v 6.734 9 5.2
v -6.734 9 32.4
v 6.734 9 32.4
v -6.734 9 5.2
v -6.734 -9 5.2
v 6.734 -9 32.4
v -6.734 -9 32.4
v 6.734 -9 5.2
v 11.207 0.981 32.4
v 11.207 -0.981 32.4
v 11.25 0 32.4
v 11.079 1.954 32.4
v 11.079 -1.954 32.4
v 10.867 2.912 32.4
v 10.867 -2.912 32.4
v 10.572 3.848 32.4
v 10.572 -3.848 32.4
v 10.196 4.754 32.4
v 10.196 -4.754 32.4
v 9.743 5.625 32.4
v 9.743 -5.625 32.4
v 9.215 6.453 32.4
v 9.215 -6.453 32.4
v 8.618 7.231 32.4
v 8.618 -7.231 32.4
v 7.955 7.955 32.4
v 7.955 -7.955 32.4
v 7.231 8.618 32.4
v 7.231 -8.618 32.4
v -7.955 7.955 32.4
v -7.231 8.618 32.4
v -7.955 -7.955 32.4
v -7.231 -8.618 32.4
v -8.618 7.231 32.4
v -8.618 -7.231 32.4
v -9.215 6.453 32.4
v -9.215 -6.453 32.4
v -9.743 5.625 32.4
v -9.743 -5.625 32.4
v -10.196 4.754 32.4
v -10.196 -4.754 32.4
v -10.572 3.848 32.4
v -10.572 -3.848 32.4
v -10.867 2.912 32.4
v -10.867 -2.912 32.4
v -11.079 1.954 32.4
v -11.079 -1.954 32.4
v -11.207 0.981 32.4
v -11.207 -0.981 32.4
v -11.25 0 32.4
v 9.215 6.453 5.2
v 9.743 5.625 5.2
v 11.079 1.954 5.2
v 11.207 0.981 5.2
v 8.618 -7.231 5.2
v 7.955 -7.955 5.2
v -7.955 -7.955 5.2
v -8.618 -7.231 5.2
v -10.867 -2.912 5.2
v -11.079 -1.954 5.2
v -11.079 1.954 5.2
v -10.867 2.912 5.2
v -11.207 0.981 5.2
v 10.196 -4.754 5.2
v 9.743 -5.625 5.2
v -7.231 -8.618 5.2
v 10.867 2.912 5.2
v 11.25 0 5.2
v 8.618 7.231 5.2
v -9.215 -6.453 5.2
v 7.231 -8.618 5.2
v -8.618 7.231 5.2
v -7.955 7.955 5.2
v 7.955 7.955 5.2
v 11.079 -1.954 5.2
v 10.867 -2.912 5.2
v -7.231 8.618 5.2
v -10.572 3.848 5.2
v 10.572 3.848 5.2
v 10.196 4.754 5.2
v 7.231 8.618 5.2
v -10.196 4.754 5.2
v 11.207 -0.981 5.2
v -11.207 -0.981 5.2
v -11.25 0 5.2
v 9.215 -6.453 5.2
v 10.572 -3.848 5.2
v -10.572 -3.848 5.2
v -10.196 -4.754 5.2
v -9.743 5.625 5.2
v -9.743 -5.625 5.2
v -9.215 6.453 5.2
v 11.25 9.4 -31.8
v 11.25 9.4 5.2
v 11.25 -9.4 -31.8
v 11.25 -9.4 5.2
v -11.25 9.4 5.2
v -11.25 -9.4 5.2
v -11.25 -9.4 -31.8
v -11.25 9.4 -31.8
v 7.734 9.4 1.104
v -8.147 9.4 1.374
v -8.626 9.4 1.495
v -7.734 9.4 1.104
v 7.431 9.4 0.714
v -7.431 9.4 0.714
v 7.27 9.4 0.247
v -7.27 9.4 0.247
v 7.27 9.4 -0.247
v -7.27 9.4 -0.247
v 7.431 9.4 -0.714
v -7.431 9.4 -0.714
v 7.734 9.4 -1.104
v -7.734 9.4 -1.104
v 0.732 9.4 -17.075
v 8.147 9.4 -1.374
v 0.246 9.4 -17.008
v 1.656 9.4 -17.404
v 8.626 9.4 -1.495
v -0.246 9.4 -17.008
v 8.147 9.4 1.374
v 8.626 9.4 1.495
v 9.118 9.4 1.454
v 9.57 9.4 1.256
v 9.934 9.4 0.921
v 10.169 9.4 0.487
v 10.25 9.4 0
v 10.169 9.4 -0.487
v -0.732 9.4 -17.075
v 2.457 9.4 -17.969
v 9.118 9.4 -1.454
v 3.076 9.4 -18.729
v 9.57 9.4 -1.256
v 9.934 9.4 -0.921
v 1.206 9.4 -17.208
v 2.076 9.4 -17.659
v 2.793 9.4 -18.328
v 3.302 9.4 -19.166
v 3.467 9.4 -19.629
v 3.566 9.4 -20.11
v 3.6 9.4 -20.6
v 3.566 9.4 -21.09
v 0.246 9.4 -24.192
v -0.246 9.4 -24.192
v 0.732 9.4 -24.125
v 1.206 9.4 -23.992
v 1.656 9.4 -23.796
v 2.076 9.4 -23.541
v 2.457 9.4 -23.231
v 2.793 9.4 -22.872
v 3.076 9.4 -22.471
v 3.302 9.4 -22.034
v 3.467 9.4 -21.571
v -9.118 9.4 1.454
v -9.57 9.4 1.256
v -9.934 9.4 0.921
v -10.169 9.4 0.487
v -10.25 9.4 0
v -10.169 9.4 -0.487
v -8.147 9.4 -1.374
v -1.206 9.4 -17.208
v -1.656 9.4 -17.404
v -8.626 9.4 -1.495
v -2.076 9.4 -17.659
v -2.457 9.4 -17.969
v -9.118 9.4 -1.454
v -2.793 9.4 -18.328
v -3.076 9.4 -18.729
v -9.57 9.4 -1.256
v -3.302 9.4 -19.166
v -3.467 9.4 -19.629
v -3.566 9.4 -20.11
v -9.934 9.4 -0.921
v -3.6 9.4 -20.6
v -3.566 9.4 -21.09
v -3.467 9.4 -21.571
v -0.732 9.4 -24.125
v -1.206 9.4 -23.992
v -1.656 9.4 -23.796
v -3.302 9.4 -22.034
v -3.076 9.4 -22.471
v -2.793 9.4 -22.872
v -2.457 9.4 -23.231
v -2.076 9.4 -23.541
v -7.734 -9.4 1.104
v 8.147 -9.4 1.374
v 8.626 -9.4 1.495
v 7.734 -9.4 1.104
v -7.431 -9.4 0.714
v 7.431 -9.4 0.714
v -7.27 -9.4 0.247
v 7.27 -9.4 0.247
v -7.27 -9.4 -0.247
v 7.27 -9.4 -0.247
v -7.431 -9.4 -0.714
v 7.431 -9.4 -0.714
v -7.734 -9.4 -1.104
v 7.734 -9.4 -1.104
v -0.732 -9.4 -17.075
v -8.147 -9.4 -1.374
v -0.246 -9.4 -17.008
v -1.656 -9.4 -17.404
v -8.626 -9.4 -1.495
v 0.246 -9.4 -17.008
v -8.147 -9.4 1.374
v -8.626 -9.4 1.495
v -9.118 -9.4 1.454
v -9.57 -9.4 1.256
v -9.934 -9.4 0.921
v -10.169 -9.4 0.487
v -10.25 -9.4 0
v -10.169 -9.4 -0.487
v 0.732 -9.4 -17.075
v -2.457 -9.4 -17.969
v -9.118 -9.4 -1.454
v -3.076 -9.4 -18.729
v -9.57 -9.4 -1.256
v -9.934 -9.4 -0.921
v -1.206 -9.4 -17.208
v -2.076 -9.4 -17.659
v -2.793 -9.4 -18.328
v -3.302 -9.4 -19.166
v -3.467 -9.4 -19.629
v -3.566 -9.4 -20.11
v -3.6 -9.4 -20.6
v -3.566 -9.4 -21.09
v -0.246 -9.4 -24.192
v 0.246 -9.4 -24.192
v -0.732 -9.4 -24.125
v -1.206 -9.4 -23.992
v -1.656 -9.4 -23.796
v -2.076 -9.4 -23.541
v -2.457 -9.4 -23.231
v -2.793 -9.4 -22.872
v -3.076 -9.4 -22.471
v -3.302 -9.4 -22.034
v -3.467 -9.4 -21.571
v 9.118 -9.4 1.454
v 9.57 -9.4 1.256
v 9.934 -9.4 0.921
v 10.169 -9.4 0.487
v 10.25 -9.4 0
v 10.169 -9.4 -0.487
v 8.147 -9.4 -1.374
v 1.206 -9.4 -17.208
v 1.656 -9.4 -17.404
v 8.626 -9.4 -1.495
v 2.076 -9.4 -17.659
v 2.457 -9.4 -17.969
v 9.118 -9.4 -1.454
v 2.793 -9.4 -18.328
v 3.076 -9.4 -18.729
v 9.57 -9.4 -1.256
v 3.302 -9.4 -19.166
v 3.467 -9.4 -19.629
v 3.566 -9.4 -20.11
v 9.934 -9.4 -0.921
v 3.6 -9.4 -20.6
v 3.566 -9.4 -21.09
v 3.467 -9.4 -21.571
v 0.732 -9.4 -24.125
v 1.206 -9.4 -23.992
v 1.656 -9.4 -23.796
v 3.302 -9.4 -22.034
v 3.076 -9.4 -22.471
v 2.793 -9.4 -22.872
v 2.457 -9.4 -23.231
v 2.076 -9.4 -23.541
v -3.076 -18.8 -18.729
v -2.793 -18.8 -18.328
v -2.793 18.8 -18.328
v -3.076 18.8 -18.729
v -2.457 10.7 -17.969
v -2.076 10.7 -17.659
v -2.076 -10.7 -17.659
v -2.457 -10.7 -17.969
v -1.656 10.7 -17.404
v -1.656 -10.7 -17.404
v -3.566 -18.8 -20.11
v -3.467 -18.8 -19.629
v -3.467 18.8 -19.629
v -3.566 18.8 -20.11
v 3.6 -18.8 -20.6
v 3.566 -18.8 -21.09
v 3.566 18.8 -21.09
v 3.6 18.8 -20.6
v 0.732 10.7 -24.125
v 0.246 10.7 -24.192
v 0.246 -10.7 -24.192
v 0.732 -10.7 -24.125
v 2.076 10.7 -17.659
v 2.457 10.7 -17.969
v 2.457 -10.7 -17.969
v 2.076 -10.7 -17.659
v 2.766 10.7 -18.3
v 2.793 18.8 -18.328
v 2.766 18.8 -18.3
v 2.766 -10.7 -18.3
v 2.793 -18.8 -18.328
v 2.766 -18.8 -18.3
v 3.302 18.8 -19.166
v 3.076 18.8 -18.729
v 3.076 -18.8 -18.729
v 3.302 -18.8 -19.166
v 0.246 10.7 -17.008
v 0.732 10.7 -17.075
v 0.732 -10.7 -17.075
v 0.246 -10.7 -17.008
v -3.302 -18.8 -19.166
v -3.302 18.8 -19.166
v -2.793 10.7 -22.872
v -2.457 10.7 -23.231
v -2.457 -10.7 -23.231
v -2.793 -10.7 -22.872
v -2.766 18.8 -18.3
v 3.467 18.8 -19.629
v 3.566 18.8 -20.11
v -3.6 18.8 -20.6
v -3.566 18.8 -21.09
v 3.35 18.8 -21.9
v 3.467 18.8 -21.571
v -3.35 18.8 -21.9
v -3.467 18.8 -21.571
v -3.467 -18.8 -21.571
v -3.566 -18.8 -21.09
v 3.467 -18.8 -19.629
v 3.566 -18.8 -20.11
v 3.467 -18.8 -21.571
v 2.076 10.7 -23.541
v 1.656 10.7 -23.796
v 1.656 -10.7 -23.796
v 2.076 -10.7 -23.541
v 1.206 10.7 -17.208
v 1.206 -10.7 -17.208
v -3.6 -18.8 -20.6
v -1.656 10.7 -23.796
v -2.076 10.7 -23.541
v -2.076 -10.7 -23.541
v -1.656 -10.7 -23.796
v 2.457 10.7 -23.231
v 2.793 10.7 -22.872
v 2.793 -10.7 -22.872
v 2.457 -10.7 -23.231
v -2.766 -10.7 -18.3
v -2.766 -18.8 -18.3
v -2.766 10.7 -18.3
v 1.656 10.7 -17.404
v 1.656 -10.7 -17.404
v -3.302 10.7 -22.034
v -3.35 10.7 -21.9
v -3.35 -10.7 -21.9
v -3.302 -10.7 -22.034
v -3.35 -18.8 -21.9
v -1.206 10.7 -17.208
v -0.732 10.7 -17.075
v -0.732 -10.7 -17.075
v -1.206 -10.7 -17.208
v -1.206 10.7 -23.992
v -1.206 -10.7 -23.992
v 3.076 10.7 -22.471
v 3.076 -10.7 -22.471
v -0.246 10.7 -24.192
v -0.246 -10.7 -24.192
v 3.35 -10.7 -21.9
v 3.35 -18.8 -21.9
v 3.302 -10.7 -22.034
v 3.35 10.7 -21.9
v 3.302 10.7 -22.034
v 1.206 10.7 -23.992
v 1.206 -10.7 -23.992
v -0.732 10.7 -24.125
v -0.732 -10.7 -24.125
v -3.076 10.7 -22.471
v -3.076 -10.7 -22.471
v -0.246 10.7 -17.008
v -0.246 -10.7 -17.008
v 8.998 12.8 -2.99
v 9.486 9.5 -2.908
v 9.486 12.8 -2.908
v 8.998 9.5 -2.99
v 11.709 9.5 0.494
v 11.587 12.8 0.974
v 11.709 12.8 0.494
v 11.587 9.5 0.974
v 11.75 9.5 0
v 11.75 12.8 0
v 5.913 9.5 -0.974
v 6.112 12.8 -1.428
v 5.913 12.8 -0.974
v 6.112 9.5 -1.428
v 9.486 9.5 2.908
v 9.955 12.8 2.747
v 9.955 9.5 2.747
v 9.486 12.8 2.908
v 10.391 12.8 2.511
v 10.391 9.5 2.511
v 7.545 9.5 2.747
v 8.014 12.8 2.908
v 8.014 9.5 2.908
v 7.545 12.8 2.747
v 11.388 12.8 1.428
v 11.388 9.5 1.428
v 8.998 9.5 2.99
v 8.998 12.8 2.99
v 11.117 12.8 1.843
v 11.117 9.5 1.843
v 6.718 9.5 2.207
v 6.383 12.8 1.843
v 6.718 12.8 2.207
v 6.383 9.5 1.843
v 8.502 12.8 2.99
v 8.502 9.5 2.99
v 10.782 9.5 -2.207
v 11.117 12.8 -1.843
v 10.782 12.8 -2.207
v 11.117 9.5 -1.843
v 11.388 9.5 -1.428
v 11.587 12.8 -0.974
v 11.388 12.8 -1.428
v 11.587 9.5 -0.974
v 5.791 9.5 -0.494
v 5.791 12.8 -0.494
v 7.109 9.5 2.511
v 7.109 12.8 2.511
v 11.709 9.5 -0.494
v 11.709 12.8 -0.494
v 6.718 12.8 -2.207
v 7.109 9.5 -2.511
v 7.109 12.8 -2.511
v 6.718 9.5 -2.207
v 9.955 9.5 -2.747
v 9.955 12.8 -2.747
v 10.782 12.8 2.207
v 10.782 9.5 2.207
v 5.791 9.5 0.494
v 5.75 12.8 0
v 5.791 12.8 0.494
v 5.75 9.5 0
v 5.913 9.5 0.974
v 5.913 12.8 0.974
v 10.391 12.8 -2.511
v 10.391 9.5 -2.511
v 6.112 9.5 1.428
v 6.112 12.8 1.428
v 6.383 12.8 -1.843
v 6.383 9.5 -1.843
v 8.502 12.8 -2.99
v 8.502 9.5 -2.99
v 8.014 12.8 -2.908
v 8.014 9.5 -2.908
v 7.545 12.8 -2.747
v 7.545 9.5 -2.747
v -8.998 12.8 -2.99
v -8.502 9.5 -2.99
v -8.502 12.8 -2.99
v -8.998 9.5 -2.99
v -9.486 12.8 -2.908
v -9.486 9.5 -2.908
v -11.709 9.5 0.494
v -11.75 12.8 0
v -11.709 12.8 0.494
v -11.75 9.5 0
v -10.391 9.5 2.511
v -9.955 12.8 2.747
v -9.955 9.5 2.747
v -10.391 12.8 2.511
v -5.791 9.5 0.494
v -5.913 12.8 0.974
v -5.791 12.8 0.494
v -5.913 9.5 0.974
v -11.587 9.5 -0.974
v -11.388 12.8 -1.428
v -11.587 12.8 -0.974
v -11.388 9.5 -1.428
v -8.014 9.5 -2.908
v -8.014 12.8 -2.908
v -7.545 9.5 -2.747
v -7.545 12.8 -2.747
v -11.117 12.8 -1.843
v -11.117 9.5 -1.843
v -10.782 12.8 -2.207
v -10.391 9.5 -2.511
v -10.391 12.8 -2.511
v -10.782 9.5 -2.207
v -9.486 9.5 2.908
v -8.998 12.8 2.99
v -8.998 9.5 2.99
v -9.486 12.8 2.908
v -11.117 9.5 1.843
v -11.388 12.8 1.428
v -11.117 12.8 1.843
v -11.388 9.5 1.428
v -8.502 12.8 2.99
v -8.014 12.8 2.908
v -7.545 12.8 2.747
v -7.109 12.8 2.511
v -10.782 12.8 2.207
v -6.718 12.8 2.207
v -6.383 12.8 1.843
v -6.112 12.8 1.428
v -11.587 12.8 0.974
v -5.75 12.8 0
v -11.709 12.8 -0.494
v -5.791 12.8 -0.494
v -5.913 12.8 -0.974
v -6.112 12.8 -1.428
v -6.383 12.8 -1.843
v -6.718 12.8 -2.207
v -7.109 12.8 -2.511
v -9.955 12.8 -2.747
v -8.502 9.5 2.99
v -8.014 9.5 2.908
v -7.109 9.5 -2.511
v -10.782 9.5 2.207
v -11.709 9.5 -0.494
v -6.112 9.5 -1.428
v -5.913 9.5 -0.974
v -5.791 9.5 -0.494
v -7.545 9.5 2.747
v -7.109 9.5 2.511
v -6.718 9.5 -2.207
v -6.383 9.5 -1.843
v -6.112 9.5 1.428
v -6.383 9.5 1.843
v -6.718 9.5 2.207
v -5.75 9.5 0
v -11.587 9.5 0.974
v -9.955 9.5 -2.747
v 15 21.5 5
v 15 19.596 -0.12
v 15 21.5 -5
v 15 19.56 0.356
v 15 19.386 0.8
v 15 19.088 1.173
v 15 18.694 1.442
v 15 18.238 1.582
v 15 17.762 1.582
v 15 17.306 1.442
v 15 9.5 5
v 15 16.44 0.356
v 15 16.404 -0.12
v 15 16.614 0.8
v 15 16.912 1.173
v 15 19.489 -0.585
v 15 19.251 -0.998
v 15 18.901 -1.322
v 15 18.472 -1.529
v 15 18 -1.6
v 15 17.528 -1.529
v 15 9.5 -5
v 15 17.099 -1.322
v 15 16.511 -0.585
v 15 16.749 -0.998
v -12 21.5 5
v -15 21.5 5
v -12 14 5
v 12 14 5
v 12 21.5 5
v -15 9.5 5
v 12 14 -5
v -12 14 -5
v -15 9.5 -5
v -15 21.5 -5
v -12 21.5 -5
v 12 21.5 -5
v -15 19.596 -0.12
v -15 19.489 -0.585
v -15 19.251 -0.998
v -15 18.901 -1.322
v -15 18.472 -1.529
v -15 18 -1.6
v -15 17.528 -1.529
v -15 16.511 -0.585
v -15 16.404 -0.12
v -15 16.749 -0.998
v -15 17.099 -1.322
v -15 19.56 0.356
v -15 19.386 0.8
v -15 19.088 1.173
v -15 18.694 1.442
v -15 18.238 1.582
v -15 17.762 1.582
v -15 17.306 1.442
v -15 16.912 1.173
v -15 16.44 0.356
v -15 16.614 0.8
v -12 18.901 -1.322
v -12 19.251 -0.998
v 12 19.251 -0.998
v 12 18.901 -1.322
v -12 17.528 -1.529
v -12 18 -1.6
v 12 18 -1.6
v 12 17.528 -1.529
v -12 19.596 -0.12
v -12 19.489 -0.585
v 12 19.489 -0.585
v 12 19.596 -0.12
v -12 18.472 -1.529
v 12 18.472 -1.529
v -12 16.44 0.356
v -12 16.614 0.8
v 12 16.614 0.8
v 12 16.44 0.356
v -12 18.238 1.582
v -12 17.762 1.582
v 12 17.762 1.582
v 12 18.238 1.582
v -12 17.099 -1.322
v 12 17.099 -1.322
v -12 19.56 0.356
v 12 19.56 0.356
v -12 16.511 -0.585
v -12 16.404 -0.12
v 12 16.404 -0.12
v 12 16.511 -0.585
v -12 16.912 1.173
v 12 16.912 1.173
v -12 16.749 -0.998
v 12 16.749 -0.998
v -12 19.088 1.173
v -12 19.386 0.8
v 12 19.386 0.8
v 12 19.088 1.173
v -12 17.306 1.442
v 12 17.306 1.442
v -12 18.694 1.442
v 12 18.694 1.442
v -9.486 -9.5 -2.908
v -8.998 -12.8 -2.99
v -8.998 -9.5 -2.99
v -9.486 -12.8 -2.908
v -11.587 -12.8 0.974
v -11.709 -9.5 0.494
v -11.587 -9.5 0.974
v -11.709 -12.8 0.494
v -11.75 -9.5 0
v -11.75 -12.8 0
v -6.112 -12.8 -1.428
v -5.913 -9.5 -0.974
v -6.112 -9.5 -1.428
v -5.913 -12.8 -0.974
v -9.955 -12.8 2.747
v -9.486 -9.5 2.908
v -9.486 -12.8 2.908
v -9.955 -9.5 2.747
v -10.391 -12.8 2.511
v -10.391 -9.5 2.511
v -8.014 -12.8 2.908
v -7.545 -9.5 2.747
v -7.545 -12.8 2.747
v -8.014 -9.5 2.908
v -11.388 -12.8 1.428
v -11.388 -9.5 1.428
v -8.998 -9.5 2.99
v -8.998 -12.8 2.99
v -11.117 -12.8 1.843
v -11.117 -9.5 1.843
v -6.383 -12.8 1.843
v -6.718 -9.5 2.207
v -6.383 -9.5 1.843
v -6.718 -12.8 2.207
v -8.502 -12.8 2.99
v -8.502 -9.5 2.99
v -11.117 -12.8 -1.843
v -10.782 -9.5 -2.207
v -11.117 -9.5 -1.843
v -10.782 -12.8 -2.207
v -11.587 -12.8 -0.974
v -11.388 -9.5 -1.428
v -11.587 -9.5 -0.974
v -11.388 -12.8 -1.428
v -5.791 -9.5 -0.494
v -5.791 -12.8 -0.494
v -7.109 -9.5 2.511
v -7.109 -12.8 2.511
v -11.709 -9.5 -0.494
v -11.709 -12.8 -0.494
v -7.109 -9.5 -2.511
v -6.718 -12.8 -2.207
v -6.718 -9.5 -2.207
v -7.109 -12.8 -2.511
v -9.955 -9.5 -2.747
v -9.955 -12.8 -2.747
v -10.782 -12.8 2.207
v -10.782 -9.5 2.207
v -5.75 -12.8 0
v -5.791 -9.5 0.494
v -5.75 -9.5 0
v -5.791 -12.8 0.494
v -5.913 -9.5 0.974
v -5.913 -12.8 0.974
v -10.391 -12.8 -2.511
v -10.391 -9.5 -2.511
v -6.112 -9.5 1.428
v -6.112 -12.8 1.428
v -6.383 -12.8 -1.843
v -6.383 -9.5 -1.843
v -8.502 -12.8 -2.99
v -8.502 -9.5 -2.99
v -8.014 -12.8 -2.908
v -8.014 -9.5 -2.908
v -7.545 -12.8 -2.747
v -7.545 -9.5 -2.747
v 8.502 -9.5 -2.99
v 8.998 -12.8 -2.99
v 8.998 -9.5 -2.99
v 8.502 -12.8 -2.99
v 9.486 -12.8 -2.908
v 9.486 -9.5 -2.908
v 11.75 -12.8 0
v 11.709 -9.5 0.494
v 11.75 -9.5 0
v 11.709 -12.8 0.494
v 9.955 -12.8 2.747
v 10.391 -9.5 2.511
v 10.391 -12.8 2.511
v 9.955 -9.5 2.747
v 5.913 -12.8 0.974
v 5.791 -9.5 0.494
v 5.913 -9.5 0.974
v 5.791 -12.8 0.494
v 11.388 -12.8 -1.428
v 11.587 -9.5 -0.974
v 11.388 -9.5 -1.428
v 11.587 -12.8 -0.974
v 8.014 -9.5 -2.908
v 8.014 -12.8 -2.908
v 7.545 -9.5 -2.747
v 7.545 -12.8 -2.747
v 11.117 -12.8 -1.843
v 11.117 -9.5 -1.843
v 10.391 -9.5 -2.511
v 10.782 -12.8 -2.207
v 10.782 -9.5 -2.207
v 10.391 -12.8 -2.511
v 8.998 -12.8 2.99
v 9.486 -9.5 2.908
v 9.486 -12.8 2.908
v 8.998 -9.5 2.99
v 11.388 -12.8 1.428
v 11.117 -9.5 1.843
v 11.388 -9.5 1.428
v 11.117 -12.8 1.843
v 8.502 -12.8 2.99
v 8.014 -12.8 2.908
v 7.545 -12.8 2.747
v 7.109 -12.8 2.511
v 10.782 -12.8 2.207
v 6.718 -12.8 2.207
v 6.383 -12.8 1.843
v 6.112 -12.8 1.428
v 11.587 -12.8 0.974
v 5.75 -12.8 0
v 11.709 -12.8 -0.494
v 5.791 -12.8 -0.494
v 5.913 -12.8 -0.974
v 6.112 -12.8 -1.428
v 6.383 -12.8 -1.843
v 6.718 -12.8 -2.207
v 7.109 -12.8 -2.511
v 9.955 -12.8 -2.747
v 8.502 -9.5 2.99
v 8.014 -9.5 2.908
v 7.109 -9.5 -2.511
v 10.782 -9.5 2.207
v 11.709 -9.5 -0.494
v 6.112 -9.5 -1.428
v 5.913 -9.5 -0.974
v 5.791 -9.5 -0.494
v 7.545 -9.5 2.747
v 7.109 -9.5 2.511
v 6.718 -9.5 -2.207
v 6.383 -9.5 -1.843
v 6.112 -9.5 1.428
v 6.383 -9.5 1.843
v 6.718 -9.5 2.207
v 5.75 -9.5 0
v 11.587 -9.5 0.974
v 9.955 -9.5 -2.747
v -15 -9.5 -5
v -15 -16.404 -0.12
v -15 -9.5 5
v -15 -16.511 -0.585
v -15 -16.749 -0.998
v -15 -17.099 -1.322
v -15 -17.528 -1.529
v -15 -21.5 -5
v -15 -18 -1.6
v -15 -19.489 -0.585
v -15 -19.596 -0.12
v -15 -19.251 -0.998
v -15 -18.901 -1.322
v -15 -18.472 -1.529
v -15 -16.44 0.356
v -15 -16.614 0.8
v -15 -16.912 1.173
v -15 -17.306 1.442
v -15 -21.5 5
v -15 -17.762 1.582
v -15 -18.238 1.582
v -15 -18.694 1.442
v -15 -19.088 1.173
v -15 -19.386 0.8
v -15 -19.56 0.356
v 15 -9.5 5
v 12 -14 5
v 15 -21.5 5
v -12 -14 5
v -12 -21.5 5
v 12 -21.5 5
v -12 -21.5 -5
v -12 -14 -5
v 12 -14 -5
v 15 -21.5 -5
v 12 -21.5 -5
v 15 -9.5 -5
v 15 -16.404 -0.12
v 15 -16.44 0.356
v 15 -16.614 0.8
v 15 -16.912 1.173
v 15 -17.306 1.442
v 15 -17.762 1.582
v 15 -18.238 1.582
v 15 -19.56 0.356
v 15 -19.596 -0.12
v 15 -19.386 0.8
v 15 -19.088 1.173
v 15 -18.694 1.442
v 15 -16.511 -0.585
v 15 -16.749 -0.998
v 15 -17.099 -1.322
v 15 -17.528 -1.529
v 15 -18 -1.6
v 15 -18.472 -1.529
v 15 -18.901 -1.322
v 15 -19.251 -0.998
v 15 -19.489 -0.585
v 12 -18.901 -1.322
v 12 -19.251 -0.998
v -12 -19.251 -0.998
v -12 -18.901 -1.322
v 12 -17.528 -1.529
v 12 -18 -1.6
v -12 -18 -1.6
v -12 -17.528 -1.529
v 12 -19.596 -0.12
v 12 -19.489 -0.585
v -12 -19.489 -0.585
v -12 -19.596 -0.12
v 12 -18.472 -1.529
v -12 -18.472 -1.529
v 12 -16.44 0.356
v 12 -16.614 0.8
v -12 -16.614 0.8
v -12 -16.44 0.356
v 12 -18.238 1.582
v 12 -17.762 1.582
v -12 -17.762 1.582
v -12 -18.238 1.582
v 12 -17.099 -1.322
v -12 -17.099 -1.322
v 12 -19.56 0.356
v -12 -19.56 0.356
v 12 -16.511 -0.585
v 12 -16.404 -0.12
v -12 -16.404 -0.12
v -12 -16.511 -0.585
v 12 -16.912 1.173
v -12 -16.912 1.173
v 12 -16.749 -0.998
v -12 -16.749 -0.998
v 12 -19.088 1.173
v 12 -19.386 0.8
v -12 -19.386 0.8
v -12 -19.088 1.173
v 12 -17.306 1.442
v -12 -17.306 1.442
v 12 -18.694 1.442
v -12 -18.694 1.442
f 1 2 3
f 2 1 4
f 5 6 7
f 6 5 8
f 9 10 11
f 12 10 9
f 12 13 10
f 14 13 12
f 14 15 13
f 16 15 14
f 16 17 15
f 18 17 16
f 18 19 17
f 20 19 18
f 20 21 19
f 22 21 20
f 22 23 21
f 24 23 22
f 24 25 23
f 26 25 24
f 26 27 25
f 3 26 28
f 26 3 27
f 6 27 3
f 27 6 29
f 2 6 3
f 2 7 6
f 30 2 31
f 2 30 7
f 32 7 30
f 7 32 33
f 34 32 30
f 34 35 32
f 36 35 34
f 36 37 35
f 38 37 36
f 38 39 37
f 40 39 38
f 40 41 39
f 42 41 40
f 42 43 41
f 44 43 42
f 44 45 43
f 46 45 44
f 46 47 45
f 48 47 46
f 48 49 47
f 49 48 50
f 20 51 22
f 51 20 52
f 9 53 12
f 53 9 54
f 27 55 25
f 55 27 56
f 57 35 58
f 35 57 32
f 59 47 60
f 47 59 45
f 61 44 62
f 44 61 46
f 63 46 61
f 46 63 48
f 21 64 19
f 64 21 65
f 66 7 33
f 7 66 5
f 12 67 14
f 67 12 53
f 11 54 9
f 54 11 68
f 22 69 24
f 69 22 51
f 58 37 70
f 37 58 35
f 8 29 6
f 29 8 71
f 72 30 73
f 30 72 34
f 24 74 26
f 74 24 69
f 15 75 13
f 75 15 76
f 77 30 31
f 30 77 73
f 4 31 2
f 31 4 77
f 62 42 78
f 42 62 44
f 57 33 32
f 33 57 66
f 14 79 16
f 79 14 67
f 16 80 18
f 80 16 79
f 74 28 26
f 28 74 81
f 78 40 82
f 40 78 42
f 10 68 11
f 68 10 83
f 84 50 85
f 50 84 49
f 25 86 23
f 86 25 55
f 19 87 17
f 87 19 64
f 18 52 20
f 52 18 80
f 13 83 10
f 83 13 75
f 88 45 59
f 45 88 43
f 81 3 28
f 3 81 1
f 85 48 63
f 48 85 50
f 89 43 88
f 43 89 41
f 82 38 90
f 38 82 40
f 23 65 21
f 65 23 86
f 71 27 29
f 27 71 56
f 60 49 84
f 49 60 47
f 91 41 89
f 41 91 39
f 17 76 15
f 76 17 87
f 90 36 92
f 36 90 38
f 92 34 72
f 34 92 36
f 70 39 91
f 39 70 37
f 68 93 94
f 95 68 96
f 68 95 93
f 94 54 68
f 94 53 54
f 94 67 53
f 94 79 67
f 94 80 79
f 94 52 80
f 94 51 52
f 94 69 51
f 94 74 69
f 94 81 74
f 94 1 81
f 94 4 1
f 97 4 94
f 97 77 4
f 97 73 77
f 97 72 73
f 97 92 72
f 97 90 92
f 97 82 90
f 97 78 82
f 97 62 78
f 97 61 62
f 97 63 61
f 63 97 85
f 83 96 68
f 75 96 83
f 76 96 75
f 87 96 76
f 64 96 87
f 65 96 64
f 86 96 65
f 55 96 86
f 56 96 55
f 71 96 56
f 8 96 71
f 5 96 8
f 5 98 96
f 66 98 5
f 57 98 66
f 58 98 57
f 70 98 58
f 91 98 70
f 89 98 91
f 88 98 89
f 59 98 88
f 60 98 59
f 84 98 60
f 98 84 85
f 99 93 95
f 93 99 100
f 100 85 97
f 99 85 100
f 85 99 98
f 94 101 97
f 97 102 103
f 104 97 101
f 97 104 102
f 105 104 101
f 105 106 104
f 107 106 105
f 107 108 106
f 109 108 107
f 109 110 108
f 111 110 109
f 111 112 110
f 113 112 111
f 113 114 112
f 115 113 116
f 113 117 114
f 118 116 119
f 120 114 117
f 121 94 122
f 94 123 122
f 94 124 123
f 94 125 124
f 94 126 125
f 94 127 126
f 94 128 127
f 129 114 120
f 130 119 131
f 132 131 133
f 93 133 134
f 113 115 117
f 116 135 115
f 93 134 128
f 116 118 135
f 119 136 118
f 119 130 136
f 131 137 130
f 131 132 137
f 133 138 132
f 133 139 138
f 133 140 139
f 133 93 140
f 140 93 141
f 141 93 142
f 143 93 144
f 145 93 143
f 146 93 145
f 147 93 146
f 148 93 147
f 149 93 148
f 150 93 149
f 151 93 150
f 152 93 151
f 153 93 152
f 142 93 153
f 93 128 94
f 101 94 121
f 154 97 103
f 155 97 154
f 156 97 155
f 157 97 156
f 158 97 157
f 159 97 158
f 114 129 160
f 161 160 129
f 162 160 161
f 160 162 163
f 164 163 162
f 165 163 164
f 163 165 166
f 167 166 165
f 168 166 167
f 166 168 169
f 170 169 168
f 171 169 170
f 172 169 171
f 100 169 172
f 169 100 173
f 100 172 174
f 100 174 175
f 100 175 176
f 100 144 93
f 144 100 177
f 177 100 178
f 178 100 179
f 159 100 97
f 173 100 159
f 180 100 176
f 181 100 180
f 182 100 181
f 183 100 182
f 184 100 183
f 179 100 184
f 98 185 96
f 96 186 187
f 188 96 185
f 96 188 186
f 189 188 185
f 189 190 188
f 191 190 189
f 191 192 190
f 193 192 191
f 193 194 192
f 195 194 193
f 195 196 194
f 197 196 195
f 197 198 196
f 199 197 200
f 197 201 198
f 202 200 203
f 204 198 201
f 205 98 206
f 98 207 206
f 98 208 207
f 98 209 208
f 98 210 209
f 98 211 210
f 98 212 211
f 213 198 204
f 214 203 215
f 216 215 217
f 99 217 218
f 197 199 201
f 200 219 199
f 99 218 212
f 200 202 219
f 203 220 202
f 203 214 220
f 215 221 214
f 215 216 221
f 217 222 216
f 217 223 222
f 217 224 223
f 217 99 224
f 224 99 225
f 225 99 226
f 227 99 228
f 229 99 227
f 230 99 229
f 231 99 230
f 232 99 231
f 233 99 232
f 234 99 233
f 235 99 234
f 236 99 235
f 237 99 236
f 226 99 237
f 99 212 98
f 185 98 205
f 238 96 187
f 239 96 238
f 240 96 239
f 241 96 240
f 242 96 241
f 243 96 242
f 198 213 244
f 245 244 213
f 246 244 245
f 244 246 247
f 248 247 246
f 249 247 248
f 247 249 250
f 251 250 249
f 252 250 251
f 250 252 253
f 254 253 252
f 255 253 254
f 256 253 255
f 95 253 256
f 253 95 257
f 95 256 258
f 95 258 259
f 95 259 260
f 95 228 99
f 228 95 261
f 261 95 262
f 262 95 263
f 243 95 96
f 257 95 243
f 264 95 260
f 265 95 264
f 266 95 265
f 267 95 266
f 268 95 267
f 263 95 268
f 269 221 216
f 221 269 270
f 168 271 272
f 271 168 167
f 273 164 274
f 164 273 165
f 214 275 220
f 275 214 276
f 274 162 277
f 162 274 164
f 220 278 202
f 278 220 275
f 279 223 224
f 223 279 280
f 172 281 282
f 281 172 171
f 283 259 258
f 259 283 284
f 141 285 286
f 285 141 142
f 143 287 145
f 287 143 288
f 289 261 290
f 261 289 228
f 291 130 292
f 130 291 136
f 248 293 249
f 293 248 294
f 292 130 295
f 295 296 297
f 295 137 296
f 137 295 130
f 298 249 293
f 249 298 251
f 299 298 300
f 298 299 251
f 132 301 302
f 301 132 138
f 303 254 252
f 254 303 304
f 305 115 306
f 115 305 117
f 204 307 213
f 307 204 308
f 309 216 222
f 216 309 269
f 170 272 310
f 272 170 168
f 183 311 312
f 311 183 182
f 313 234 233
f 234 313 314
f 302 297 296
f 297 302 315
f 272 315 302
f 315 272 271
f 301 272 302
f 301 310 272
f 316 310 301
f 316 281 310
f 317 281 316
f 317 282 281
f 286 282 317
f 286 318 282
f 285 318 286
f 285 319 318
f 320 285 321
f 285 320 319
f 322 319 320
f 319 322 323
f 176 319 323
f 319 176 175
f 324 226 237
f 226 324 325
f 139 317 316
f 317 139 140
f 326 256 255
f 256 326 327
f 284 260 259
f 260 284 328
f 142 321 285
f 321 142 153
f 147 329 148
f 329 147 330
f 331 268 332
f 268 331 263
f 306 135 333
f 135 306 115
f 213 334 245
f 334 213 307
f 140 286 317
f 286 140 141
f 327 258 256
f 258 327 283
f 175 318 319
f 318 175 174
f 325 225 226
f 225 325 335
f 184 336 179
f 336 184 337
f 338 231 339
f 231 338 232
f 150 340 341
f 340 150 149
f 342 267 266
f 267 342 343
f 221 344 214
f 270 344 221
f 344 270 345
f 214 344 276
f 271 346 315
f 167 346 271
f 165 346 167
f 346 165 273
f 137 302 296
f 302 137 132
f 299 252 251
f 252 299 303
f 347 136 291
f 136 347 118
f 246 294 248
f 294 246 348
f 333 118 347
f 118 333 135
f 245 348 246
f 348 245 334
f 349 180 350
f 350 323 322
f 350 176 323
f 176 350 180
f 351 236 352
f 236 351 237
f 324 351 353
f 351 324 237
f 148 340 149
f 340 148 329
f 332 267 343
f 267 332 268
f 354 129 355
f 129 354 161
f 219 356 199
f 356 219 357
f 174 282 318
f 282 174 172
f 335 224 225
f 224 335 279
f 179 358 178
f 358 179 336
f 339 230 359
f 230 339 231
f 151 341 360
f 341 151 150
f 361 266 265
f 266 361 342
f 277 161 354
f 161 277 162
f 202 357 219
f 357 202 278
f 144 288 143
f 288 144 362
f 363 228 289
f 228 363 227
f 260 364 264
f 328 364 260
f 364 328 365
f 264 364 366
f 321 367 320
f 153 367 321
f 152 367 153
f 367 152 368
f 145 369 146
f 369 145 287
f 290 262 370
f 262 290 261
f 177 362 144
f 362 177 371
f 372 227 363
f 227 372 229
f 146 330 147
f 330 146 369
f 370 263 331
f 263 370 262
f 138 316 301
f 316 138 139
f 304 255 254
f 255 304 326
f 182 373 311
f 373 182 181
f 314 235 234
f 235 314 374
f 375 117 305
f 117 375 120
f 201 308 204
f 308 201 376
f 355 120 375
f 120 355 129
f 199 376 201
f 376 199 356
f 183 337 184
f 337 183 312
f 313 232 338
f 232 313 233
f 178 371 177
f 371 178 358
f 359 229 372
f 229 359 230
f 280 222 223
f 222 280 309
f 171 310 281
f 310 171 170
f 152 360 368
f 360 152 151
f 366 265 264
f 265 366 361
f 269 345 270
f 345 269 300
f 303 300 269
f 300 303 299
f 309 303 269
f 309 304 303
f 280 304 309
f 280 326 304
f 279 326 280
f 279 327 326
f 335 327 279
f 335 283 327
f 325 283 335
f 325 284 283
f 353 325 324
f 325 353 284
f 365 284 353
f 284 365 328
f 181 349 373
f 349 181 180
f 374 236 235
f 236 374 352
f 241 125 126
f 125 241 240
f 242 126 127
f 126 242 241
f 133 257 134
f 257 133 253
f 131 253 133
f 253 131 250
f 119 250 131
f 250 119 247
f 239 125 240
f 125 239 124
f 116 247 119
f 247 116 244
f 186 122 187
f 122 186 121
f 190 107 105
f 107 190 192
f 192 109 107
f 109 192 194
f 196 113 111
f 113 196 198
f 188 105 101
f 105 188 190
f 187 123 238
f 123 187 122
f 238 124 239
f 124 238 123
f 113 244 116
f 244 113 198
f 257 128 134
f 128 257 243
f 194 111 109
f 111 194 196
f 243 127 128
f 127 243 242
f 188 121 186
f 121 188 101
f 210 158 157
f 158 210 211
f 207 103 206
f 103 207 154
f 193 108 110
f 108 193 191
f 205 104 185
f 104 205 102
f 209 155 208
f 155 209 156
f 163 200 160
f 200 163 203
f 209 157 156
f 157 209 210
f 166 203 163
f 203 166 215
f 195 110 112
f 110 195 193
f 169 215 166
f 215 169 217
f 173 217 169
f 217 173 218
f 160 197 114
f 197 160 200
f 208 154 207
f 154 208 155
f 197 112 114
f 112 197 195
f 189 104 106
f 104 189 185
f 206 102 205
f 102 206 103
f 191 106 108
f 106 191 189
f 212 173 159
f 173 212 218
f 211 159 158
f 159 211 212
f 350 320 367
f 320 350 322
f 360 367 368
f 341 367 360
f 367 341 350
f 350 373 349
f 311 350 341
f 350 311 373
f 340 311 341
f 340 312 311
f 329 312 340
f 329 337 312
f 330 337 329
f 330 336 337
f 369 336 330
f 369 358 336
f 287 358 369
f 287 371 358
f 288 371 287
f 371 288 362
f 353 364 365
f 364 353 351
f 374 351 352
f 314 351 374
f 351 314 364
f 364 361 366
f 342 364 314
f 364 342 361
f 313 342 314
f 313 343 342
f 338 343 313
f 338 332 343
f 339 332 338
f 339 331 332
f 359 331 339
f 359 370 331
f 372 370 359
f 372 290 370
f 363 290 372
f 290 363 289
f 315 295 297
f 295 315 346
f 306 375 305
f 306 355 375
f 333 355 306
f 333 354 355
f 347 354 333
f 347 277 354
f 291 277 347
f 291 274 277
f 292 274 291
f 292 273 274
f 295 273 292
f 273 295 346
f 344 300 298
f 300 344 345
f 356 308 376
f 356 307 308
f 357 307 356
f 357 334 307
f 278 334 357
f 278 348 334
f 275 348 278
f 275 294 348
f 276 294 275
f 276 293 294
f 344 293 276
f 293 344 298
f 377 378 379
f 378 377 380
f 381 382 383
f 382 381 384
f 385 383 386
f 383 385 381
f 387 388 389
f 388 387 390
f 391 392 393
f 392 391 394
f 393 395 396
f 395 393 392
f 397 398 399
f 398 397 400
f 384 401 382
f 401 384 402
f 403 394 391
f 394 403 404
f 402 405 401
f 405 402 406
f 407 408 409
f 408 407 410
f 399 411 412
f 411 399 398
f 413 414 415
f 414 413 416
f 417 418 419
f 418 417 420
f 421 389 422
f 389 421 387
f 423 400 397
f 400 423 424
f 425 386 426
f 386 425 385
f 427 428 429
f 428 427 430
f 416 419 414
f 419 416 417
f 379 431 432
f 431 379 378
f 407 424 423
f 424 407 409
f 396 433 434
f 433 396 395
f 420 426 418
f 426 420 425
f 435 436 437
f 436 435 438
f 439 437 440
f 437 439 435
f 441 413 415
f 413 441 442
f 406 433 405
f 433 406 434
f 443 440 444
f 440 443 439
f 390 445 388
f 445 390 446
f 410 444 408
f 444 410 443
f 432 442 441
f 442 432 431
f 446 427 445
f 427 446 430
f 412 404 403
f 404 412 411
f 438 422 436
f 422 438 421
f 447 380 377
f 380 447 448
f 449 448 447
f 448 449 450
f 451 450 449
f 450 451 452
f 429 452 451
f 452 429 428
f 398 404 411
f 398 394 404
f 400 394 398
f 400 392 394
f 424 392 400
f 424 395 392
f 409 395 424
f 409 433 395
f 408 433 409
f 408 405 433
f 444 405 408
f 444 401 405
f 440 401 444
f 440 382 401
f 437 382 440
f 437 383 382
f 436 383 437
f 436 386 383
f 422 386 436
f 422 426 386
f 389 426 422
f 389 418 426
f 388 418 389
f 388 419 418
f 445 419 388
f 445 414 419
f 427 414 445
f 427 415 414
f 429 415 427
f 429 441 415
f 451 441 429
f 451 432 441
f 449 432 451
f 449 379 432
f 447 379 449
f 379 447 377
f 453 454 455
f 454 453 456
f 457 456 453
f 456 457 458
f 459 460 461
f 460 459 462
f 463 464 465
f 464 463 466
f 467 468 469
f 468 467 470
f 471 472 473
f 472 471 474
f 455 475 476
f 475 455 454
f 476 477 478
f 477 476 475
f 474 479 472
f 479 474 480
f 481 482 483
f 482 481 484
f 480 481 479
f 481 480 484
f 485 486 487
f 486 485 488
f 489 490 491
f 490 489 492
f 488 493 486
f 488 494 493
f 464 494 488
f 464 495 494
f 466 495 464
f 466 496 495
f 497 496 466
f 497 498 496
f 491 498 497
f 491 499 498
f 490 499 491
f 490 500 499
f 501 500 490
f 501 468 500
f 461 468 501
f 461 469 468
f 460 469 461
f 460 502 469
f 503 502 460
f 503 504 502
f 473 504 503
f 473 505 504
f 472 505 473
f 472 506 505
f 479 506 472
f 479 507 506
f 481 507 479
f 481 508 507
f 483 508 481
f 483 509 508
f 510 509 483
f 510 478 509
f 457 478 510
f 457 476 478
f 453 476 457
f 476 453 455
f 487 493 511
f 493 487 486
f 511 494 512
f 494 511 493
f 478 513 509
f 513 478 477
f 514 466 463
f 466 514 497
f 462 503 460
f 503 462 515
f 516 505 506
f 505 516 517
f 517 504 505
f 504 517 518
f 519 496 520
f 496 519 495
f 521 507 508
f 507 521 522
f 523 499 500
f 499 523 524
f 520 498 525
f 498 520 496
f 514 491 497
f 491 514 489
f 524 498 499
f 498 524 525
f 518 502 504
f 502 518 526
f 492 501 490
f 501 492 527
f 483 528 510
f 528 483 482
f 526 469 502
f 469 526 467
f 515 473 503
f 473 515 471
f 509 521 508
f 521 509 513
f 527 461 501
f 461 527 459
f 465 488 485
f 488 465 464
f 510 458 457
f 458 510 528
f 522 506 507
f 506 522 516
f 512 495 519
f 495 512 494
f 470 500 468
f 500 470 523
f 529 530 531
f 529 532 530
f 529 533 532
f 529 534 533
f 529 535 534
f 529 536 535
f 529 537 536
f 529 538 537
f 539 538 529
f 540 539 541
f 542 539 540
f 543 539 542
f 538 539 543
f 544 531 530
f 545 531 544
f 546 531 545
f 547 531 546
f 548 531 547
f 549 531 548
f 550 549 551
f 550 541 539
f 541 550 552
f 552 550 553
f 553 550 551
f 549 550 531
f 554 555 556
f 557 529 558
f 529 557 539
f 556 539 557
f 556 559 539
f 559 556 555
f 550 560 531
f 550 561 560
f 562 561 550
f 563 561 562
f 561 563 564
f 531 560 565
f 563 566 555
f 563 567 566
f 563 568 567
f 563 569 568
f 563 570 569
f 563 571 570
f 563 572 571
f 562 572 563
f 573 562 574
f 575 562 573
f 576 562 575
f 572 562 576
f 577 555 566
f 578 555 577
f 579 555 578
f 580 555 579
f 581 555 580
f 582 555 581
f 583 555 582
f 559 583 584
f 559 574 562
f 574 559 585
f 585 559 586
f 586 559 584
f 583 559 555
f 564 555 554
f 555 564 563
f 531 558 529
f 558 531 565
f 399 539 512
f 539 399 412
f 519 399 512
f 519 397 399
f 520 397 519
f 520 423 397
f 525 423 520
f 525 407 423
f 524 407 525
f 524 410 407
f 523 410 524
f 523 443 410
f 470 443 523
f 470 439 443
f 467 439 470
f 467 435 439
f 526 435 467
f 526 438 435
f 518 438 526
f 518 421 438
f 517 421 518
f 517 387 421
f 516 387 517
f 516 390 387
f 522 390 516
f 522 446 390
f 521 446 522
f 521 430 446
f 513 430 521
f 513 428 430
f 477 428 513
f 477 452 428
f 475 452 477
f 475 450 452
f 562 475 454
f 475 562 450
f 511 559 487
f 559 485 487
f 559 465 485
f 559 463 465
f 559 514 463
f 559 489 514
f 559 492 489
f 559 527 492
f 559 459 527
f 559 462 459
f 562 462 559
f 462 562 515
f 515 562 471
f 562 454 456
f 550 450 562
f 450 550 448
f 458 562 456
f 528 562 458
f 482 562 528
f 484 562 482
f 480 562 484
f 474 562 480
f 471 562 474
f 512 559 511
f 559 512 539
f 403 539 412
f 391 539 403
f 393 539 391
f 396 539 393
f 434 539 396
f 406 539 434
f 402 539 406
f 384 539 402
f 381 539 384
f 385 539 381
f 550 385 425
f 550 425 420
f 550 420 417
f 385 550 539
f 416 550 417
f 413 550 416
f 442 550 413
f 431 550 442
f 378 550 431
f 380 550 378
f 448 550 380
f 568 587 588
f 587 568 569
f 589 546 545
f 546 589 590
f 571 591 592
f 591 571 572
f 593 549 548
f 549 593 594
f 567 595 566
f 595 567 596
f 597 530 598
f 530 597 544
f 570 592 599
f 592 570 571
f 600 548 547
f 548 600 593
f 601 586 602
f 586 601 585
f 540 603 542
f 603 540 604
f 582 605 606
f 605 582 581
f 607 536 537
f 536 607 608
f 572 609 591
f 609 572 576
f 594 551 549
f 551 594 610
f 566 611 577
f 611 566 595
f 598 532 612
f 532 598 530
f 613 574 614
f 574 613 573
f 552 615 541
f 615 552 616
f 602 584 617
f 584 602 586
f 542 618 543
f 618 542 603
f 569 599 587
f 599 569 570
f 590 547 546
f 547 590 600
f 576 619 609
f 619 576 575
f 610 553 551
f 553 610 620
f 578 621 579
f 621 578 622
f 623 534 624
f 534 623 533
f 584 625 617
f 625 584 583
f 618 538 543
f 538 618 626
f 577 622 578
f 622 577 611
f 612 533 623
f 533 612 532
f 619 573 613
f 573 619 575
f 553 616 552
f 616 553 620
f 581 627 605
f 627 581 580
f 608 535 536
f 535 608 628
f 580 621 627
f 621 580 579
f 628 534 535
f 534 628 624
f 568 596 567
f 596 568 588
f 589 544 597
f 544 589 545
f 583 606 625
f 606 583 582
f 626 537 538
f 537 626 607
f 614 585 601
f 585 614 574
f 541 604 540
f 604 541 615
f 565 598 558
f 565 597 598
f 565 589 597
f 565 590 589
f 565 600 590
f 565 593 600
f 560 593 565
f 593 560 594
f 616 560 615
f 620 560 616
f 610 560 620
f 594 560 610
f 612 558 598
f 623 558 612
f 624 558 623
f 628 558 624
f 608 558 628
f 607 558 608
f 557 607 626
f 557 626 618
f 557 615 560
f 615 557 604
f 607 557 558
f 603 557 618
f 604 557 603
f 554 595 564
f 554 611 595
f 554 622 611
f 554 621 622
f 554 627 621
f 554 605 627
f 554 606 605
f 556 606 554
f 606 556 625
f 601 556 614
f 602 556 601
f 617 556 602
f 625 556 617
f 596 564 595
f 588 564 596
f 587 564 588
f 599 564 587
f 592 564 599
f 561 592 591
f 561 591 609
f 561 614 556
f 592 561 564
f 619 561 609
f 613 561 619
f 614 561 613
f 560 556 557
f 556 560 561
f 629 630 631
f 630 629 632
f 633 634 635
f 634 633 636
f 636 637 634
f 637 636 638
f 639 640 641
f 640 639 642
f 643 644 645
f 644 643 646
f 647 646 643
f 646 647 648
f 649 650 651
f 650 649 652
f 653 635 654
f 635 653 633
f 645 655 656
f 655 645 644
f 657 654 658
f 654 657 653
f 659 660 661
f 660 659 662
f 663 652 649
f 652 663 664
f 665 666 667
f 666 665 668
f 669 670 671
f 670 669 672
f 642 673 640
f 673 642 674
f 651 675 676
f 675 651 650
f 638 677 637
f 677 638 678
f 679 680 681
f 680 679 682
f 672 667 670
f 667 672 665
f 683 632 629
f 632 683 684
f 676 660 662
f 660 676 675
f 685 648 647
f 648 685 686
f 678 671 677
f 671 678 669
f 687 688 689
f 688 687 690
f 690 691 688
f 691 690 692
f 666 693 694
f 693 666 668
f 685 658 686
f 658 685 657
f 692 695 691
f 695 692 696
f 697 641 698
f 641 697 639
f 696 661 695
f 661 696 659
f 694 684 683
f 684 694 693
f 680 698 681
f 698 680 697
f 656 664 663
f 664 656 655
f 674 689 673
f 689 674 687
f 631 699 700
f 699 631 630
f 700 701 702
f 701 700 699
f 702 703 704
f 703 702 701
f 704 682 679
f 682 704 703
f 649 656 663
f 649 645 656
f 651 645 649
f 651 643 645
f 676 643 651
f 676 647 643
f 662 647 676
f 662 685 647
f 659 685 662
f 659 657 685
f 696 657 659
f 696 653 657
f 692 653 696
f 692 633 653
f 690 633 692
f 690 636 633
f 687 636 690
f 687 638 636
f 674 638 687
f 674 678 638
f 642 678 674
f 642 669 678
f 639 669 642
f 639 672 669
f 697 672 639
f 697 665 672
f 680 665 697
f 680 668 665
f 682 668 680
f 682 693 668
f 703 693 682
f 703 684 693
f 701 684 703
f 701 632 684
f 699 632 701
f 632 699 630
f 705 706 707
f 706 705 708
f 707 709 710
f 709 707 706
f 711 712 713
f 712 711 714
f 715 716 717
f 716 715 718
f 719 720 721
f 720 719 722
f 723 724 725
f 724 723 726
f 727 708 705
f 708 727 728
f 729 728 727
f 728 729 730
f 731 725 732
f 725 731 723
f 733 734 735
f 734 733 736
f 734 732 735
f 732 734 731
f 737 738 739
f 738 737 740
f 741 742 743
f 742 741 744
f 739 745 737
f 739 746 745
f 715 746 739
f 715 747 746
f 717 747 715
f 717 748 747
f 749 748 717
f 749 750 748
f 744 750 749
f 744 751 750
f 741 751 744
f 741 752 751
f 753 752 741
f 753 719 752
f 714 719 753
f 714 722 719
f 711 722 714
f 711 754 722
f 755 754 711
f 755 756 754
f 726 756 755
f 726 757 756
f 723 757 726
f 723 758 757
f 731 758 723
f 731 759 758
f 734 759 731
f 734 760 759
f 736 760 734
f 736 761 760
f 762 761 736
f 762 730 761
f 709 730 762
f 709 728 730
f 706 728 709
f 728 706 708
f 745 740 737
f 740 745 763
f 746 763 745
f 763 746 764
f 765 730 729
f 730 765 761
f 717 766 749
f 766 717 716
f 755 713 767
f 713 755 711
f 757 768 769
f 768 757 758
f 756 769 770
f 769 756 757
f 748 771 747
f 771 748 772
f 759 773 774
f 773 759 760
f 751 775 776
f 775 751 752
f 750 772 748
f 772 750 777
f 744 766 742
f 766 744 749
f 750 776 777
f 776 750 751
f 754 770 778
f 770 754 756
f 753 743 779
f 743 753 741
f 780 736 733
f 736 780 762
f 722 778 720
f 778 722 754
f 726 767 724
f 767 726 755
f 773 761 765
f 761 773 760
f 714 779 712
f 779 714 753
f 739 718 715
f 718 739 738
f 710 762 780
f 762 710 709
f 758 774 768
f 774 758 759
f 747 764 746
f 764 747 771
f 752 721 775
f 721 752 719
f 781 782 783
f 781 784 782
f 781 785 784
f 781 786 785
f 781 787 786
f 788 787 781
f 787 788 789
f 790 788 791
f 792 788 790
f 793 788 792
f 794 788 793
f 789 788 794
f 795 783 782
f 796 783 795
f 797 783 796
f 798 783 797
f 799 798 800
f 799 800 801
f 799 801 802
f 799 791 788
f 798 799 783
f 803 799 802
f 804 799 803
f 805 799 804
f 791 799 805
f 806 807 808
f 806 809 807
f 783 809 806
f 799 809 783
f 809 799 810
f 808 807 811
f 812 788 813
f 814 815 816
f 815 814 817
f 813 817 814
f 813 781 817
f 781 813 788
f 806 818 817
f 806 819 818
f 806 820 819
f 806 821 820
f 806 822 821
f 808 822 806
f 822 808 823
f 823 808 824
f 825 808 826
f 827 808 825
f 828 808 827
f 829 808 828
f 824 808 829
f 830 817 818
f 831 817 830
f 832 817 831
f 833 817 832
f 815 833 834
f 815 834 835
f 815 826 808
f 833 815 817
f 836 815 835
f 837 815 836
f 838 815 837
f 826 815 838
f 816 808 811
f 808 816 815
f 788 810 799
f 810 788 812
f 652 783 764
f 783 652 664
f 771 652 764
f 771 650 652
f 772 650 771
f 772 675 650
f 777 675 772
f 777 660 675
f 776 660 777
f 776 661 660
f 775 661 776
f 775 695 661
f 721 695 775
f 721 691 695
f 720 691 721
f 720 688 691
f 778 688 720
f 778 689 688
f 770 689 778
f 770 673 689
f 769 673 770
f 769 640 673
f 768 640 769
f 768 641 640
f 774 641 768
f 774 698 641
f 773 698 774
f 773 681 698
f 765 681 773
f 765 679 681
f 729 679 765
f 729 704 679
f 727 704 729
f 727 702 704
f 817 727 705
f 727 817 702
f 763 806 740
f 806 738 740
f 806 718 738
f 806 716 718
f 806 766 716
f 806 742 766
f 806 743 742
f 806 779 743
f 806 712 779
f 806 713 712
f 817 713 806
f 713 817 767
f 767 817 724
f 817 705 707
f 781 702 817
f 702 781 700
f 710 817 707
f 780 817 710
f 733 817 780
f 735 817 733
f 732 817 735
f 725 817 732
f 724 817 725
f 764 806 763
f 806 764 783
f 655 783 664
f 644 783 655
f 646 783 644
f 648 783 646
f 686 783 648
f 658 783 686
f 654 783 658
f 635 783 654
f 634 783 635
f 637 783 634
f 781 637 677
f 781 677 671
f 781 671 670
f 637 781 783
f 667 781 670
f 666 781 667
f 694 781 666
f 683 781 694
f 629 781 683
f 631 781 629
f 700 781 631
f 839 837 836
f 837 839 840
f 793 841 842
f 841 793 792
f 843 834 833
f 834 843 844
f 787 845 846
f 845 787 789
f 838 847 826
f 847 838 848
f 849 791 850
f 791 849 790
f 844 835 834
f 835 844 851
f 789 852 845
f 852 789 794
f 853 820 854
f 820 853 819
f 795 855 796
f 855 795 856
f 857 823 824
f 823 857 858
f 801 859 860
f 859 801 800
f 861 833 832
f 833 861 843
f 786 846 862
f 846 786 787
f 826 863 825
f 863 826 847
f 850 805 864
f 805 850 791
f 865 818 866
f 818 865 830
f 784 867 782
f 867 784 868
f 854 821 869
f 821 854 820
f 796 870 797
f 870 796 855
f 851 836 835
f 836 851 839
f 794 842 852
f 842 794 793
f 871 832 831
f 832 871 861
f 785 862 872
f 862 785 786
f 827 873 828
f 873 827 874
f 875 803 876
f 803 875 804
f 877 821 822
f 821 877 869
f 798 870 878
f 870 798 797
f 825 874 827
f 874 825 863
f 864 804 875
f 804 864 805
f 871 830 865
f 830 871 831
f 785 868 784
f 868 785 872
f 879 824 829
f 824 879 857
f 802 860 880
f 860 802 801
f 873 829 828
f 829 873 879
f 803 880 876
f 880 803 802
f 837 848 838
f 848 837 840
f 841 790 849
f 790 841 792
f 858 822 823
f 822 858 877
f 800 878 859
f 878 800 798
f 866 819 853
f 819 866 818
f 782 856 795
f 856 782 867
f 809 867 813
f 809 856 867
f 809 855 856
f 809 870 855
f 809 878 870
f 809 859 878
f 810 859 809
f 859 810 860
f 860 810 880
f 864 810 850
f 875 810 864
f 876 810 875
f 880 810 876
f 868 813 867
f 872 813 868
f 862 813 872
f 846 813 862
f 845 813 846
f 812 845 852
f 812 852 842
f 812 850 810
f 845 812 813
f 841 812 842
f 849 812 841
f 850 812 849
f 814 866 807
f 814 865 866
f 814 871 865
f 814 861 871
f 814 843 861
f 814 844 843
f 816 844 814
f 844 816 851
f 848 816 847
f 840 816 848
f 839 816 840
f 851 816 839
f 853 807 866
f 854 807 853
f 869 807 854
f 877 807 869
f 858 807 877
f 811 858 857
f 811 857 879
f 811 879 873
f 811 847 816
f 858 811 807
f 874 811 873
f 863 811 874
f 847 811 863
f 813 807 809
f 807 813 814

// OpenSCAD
// file: copy.scad
// this file defines various copy functions


// this function copies his children and rotates the copies

// v: rotation vector
// n: number of copies
// center: rotate on both sides equally
module rotateCopy(v = [0,0,0], n = 1, center = false)
{
  // calculate rotation offset if center is true
  rotationOffset = -n*v/2;
  
  // copy rotate
  for (i = [0:n])
  {
    if (center)
    {
      rotate(i*v + rotationOffset) children();
    }
    else
    { 
      rotate(i*v) children();
    }
  }
}


// this function copies his children and translates the copies

// v: translation vector
// n: number of copies
// center: translate on both sides equally
module translateCopy(v = [0,0,0], n = 1, center = false)
{
  // calculate translation offset if center is true
  translationOffset = -n*v/2;
  
  // copy and translate
  for (i = [0:n])
  {
    if (center) 
    {
      translate(i*v + start) children();
    }
    else 
    {
      translate(i*v) children();
    }
  }
}


// this function copies his children and mirrors the copy

// v: mirror vector
module mirrorCopy(v = [1,0,0])
{
  children();
  mirror(v) children();
}


// this function copies his children in a grid
// translation, size and centering can be set for each dimension x,y,z

// v: translation vector
// size: size of grid
// center: translate on both sides equally
module linearGrid(v = [0,0,0], size = [1,1,1], center = [false,false,false])
{
  if (is_num(v))
  {
    // expand v to 3 dimensions
    linearGrid([v,v,v], size, center) children();
  }
  else if (is_num(size))
  {
    // expand size to 3 dimensions
    linearGrid(v, [size,size,size], center) children();
  }
  else if (is_num(center))
  {
    // expand center to 3 dimensions
    linearGrid(v, size, [center,center,center]) children();
  }
  else
  {
    translateCopy([1,0,0]*v[0], size[0]-1, center[0])
    translateCopy([0,1,0]*v[1], size[1]-1, center[1])
    translateCopy([0,0,1]*v[2], size[2]-1, center[2])
      children();
  }
}
// main file
// this file defines the motor mount


// used modules
use <copy.scad>


// global definitions
$fa = 5;
$fs = 0.5;


// shows front wheel
motor();


// assembled motor
module motor()
{
  translate([0,0,-31.8]) motorDummy();
  rotateCopy([0,0,180]) motorMount();
}


// motor mount
module motorMount()
{
  translate([0,15.5,0]) difference()
  {
    cube([30,12,10], center = true);
    translate([0,2.5,0]) rotate([0,90,0]) cylinder(d = 3.2, h = 35, center = true);
    mirrorCopy([1,0,0]) translate([17.5/2,-2.7,0]) rotate([90,0,0]) cylinder(d = 6, h = 10);
    translate([0,3.5,0]) cube([24,10,11], center = true);
  }
}


// motor dummy
module motorDummy()
{
  difference()
  {
    union()
    {
      translate([0,0,18.5]) cube([22.5,18.8,37], center = true);
      
      difference()
      {
        translate([0,0,20]) cylinder(d = 22.5, h = 44.2);
        mirrorCopy([0,1,0]) translate([0,34,42]) cube([50,50,50], center = true);
      }
      
      translate([0,0,11.2]) rotate([90,0,0]) cylinder(d = 7.2, h = 37.6, center = true);
    }
    
    mirrorCopy([1,0,0]) translate([17.5/2,0,31.8]) rotate([90,0,0]) 
      cylinder(d = 3, h = 20, center = true);
    
    mirrorCopy([0,1,0]) translate([0,15.7,4.9]) cube([10,10,10], center = true);
    mirrorCopy([0,1,0]) translate([0,15.7,18.5]) cube([10,10,10], center = true);
    
  }
}
